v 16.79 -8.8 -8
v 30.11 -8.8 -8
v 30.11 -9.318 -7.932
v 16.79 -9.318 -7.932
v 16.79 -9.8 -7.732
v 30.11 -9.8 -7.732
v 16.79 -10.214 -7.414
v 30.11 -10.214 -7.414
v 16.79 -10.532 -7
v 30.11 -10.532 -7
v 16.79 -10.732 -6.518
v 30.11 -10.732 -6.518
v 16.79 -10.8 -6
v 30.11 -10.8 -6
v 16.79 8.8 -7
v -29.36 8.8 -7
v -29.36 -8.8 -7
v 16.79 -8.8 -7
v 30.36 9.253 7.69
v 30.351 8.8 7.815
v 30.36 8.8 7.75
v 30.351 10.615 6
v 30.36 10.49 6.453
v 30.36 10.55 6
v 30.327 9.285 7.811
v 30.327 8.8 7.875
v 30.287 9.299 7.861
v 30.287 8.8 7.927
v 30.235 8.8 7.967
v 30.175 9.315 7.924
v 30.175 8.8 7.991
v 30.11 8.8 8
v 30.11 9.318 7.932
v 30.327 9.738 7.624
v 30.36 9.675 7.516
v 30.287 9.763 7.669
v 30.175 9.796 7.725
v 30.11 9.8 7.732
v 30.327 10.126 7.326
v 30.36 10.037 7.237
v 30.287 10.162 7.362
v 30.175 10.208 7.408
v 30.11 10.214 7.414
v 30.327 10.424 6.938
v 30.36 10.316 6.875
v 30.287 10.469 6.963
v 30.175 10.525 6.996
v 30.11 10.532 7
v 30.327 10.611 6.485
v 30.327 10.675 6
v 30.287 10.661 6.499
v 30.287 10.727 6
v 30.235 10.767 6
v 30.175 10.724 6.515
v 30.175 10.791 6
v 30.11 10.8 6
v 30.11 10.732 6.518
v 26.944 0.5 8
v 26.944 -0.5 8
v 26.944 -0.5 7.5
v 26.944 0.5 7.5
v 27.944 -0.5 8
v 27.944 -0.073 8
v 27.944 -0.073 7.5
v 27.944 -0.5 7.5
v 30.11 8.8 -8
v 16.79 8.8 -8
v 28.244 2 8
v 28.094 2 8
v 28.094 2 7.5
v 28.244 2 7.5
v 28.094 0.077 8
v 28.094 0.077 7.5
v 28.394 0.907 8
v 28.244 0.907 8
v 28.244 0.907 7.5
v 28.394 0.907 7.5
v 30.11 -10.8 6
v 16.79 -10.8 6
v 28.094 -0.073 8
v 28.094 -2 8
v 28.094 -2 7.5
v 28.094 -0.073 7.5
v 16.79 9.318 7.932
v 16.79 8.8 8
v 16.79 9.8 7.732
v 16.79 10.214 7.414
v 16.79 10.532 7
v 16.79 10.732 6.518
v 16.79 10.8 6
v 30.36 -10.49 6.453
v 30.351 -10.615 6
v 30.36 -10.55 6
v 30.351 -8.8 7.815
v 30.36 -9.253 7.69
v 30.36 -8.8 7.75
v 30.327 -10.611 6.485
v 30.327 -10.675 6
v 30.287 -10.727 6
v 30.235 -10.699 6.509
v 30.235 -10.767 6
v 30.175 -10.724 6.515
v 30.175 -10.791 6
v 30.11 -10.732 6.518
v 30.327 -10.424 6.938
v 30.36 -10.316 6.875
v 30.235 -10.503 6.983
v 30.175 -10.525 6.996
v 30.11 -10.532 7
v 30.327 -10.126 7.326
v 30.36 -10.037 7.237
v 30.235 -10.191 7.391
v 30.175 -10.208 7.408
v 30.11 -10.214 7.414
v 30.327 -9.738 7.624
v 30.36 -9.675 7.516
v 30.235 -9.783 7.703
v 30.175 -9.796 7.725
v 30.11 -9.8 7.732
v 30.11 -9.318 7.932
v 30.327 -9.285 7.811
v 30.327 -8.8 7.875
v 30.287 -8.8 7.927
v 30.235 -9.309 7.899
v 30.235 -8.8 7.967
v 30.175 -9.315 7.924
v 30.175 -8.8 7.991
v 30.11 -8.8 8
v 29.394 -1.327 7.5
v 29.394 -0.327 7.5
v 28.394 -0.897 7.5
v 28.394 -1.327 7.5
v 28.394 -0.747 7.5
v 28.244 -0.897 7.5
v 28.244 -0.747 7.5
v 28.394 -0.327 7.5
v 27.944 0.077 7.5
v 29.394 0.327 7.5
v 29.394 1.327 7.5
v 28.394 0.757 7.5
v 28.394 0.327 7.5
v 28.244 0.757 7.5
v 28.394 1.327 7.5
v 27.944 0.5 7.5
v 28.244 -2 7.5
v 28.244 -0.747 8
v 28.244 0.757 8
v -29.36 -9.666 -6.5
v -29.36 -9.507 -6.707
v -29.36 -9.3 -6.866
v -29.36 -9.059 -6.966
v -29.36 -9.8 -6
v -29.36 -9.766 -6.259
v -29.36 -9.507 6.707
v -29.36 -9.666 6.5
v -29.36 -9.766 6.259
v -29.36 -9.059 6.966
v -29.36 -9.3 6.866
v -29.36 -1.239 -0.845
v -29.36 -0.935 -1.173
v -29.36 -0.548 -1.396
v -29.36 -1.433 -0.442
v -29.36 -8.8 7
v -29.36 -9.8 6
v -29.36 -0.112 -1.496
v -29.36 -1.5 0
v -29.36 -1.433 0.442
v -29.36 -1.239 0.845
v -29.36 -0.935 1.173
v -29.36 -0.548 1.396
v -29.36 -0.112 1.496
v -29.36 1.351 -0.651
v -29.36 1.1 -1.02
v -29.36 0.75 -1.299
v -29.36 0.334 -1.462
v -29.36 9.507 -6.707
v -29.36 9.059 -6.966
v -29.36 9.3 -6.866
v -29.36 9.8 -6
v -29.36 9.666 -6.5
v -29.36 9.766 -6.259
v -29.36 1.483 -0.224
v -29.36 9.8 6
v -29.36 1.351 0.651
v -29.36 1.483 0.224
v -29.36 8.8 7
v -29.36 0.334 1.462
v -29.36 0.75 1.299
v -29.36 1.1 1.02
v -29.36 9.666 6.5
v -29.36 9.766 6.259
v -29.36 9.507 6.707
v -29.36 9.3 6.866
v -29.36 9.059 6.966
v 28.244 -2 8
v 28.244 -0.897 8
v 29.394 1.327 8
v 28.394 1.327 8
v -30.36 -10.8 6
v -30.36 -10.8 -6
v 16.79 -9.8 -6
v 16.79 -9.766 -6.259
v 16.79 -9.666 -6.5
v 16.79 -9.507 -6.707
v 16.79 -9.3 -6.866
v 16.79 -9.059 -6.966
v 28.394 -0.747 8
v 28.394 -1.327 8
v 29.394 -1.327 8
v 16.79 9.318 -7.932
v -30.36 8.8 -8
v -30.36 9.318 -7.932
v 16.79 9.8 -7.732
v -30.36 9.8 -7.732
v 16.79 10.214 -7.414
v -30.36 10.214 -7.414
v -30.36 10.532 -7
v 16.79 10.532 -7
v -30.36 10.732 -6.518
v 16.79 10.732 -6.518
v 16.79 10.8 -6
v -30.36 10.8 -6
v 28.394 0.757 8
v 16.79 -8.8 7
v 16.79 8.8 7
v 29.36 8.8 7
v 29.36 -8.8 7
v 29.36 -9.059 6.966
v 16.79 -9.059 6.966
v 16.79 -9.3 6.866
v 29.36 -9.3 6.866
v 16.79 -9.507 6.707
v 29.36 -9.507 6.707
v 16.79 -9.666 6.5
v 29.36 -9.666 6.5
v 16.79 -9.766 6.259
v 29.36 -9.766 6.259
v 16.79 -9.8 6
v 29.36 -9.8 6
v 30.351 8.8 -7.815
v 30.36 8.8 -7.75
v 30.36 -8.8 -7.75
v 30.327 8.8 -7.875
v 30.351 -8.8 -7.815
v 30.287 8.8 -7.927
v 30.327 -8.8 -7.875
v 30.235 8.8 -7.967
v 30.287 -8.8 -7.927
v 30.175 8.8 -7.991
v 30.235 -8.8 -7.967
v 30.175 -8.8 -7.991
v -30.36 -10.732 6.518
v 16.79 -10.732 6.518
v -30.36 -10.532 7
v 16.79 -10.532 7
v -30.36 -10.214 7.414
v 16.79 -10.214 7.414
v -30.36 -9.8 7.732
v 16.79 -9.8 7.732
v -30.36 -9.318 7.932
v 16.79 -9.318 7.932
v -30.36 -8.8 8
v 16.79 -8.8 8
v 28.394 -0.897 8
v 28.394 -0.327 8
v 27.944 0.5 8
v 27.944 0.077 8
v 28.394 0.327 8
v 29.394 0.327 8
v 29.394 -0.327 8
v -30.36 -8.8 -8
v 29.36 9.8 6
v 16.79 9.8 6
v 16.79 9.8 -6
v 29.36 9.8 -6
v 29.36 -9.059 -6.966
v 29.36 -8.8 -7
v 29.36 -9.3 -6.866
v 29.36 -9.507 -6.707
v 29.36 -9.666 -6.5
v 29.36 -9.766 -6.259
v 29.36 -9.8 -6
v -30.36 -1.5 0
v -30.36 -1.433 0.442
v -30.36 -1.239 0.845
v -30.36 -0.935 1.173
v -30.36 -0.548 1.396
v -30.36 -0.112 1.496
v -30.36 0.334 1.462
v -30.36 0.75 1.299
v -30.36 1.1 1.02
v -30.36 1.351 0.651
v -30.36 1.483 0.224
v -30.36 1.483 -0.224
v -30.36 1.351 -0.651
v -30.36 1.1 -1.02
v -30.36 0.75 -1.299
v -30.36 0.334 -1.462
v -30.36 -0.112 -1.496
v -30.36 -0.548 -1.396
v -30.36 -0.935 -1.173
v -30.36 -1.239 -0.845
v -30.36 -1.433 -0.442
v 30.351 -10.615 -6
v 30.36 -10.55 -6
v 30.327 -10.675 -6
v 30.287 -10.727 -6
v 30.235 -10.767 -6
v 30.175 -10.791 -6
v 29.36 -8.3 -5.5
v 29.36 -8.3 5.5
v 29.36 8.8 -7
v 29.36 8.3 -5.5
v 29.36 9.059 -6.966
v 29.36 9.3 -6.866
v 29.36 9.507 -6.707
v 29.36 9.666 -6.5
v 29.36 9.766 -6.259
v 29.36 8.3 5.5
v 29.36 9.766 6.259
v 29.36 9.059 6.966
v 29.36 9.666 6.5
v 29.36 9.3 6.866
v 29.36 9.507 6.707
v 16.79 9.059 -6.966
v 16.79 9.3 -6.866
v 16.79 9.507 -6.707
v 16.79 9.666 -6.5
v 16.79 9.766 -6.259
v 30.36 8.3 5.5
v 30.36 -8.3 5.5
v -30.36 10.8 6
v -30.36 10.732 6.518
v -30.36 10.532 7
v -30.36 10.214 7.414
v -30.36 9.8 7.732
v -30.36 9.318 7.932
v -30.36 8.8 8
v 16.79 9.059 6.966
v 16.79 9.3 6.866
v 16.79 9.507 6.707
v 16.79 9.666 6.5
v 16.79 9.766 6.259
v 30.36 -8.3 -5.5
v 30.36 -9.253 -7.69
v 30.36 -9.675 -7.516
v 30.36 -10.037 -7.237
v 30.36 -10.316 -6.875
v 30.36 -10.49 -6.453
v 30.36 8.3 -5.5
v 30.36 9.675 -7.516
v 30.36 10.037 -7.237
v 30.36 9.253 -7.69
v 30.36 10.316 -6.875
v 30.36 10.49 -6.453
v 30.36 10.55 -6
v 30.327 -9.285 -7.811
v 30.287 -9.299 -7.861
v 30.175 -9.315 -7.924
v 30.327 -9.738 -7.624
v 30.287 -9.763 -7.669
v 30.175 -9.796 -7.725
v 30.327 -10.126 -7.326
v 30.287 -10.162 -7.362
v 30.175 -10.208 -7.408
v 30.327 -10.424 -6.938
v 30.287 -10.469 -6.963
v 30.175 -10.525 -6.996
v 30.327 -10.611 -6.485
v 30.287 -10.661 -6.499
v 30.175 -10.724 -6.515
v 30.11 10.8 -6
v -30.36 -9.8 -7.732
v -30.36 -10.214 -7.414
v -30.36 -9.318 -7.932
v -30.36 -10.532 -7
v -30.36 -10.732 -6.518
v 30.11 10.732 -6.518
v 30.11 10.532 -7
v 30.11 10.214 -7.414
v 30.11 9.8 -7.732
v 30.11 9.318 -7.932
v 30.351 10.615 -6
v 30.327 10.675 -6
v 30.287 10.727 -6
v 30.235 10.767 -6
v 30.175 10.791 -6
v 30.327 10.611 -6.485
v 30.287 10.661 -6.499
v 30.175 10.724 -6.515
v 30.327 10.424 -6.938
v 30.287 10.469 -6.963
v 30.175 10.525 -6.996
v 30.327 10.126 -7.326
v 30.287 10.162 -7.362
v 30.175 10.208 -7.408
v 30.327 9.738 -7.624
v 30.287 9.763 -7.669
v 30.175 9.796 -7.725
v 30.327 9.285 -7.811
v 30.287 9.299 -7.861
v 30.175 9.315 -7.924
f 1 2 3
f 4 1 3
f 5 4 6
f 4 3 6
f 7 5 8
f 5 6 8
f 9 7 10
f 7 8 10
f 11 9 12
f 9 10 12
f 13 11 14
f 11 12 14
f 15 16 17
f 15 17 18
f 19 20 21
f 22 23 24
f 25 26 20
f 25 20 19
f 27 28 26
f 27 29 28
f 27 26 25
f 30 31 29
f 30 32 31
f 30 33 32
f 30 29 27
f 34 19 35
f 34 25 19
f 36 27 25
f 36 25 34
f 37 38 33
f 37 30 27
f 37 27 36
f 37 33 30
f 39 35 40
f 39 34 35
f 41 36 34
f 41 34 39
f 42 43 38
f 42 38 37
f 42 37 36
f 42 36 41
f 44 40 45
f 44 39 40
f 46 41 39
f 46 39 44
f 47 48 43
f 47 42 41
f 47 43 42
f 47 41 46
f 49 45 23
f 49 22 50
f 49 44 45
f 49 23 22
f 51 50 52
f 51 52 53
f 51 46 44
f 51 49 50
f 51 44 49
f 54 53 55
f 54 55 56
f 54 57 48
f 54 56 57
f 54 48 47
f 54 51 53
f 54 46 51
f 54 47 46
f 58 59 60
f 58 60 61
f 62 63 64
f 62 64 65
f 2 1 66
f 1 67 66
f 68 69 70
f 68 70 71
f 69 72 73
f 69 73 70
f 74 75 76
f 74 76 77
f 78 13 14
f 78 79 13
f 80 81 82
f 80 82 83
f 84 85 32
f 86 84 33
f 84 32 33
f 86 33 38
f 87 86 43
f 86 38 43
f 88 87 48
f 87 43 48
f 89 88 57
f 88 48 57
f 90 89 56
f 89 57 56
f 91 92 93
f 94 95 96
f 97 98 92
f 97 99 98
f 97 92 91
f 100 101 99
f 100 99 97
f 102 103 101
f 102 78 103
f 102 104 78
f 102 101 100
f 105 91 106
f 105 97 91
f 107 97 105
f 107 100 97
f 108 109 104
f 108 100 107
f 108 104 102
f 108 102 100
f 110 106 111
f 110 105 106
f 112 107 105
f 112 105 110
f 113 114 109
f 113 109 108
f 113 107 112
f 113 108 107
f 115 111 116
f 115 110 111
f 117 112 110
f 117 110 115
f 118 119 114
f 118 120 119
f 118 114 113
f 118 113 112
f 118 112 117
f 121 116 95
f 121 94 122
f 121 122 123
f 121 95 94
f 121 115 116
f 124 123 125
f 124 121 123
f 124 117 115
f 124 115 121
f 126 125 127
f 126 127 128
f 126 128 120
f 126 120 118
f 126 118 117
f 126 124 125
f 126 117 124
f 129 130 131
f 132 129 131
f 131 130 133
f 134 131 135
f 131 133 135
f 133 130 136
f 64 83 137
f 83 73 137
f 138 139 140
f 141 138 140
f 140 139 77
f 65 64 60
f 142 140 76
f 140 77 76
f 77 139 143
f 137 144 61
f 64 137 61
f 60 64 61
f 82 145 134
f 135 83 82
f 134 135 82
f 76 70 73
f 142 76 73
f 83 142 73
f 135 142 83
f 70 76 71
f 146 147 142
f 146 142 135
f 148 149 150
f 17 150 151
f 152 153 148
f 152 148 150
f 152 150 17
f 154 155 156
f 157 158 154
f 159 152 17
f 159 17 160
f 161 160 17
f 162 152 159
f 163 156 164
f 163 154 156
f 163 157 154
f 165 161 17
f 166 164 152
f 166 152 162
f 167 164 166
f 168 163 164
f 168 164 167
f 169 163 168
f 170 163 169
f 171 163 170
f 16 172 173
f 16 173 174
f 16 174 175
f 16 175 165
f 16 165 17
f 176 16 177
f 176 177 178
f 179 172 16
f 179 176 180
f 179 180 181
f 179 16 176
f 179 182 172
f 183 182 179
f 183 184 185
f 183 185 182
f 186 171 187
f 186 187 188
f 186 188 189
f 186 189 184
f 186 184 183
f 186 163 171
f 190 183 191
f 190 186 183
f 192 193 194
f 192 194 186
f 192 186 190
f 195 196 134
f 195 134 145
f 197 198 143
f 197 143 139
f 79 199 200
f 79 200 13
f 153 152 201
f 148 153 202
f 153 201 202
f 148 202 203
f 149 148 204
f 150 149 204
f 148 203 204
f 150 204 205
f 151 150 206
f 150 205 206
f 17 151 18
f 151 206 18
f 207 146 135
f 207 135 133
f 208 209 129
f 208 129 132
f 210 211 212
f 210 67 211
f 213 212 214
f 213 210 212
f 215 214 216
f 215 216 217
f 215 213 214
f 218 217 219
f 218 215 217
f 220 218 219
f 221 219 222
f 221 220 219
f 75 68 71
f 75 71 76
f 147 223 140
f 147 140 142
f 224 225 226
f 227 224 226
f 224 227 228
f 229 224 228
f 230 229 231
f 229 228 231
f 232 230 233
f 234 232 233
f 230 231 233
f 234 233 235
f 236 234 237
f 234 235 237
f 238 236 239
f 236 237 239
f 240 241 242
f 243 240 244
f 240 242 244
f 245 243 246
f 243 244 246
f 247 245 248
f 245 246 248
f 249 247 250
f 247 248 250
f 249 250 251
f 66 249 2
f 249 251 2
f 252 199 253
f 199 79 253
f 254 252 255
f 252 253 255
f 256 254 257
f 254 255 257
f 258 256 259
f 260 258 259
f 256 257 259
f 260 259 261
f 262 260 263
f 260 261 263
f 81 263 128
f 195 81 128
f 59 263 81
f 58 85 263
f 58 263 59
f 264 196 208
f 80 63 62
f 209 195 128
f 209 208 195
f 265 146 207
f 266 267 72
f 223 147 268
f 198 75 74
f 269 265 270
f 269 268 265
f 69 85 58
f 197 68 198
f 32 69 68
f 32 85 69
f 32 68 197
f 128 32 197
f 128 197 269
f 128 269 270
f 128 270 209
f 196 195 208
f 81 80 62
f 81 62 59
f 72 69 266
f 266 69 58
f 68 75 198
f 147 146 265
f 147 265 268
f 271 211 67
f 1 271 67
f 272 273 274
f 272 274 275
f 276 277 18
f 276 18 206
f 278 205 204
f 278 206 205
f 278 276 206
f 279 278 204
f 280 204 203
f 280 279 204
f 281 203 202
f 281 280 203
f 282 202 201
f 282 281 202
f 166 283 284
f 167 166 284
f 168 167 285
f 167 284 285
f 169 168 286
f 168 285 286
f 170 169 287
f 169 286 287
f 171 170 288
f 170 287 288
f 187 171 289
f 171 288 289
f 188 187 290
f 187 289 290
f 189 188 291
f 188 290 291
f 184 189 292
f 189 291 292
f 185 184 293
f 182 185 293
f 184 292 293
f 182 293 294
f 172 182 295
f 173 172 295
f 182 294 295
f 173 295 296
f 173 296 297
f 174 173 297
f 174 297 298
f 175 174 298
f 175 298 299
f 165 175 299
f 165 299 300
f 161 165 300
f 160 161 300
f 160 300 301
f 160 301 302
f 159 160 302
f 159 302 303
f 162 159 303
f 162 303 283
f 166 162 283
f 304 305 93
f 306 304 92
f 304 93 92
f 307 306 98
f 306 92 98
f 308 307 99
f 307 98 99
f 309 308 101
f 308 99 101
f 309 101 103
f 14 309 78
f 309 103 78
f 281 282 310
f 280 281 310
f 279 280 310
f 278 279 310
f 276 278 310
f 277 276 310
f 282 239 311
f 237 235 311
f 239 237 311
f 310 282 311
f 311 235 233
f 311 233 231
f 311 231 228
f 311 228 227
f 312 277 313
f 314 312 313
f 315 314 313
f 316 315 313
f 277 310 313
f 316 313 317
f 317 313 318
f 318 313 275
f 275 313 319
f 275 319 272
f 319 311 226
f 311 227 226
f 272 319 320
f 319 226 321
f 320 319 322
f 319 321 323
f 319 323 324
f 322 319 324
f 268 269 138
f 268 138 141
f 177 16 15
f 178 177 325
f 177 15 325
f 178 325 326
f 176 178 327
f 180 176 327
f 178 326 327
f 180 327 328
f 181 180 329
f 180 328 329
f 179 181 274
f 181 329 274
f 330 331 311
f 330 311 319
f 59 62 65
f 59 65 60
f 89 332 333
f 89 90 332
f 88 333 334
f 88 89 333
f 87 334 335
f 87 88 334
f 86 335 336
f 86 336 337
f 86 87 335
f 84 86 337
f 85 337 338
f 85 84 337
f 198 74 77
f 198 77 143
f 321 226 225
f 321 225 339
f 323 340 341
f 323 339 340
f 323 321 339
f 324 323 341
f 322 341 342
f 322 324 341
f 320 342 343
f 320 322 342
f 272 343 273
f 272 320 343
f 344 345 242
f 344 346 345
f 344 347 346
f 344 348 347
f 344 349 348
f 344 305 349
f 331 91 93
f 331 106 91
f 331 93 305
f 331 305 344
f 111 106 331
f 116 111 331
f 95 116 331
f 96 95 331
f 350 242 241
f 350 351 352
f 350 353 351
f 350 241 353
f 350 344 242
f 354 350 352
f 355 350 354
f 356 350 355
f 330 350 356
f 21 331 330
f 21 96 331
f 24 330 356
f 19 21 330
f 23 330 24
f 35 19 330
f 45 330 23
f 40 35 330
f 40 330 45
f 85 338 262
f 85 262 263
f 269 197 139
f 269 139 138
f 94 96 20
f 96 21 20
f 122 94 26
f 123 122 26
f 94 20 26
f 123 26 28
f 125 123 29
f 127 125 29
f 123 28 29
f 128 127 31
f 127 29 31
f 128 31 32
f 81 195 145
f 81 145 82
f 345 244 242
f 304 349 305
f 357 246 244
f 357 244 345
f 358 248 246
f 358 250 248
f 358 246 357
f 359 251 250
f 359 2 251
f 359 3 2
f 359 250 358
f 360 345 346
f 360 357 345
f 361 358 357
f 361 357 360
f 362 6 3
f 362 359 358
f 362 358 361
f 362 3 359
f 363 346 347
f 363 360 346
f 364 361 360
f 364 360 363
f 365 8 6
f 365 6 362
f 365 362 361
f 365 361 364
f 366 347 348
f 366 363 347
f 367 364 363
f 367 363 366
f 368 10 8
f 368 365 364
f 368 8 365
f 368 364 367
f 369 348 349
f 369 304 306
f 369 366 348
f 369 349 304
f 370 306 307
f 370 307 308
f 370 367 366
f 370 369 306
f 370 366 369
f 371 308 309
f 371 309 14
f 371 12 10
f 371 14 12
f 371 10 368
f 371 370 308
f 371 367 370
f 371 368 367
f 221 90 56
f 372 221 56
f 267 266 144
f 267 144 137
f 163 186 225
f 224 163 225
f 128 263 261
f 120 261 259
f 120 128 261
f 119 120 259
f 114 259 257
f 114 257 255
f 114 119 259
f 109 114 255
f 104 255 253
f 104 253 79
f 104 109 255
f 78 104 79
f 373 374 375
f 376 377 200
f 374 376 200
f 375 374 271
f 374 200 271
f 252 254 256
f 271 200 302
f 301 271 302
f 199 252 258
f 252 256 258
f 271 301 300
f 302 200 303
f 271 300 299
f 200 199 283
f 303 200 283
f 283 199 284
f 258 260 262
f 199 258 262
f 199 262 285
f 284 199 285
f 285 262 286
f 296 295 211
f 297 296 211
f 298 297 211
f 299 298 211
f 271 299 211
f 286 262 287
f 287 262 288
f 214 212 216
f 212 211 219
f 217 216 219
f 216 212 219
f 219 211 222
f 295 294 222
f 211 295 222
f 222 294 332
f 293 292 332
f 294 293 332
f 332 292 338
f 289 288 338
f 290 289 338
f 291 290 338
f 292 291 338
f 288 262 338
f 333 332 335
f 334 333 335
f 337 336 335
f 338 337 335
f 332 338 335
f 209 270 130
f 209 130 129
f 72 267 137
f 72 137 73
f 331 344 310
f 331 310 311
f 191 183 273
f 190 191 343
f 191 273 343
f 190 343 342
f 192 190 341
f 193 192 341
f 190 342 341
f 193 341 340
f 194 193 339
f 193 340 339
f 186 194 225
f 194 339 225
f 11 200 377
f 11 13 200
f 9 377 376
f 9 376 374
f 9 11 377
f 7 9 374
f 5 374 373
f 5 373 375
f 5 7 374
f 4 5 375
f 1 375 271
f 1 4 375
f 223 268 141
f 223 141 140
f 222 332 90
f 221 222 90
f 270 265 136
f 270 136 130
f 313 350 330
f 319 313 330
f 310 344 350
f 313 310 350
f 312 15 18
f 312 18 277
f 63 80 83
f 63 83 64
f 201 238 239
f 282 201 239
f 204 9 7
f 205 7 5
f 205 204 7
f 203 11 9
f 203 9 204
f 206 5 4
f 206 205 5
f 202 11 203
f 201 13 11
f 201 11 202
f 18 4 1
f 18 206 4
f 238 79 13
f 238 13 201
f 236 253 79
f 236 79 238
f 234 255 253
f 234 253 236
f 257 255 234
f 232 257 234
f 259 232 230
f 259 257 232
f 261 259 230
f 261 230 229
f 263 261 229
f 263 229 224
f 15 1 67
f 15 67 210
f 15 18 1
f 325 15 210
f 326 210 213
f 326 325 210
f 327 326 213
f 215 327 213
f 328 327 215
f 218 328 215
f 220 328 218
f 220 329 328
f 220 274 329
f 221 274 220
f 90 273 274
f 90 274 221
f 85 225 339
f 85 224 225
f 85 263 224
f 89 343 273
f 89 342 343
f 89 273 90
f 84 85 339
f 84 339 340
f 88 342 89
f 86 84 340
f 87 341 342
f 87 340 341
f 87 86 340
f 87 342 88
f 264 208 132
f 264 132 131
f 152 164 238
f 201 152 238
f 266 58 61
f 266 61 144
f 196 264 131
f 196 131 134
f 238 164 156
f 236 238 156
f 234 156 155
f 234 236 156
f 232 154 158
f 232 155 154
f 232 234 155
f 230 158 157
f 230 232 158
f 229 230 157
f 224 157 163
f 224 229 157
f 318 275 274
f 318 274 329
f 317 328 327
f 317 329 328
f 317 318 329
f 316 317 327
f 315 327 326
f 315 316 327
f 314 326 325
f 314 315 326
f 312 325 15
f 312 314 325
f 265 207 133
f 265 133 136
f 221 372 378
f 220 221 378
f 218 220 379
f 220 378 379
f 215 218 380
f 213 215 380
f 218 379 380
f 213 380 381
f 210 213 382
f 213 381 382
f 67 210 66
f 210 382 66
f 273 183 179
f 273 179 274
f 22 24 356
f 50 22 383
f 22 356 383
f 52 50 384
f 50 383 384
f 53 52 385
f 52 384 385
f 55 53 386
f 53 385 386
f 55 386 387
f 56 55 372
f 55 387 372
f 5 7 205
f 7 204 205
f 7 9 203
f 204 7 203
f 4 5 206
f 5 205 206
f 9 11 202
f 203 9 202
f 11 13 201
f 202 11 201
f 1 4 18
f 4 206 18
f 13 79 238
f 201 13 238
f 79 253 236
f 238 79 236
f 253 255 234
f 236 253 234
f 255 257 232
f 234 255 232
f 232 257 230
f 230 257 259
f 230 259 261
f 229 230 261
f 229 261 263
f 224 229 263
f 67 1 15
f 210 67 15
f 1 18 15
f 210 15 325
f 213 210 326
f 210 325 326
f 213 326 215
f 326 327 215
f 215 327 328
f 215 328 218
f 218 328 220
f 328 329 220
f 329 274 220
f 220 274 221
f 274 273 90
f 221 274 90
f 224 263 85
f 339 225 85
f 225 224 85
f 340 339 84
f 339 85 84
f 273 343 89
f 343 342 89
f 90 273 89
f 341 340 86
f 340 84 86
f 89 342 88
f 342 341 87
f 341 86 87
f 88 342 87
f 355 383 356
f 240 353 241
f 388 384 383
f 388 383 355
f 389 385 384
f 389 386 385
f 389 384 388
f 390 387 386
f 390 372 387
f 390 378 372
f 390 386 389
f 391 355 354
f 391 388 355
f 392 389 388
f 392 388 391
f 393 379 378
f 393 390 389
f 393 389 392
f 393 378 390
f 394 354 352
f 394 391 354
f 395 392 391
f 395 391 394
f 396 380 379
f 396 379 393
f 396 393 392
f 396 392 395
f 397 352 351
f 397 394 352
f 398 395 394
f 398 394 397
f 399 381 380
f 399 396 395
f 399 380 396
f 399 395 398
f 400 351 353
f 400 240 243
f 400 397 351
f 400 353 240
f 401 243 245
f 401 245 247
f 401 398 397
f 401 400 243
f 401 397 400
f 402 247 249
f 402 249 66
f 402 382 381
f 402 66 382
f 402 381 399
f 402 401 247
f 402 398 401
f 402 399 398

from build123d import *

# Parameters (mm, degrees)
SKETCH_W        = 60.72
SKETCH_H        = 21.6
PAD_DEPTH       = 8
SKETCH001_W     = 13.57
SKETCH001_H     = 21.6
POCKET_DEPTH    = 10
FILLET_R        = 2
THICKNESS_T     = -1
SKETCH006_R     = 1.5
POCKET003_DEPTH = 5
SKETCH003_W     = 13.57
SKETCH003_H     = 21.6
PAD001_DEPTH    = 8
FILLET001_R     = 2
THICKNESS001_T  = -1
SKETCH004_W     = 16.6
SKETCH004_H     = 11
POCKET001_DEPTH = 5
POCKET002_DEPTH = 0.5
FILLET002_R     = 0.25


with BuildPart() as body:
    # Sketch → Pad (new body, symmetric)
    with BuildSketch(Plane.XY):
        Rectangle(SKETCH_W, SKETCH_H)
    extrude(amount=PAD_DEPTH, both=True)

    # Sketch001 → Pocket (cut, symmetric)
    with BuildSketch(Plane.XY):
        with Locations((23.575, 0)):
            Rectangle(SKETCH001_W, SKETCH001_H)
    extrude(amount=POCKET_DEPTH, both=True, mode=Mode.SUBTRACT)

    # Fillet
    fillet_edges = [body.edges().sort_by_distance(p)[0] for p in [
        (-6.785, -10.8, -8),
        (-6.785, 10.8, -8),
        (-6.785, -10.8, 8),
        (-6.785, 10.8, 8),
    ]]
    fillet(fillet_edges, radius=FILLET_R)

    # Thickness
    thickness_openings = [body.faces().sort_by_distance(p)[0] for p in [
        (16.79, 0, 0),
    ]]
    offset(amount=THICKNESS_T, openings=thickness_openings, kind=Kind.INTERSECTION)

    # Sketch006 (on Face4 of Thickness) → Pocket003 (cut)
    with BuildSketch(Plane(origin=(-30.36, 0, 0), x_dir=(0, -1, 0), z_dir=(-1, 0, 0))):
        Circle(SKETCH006_R)
    extrude(amount=-POCKET003_DEPTH, mode=Mode.SUBTRACT)


with BuildPart() as body001:
    # Sketch003 → Pad001 (new body, symmetric)
    with BuildSketch(Plane.XY):
        with Locations((23.575, 0)):
            Rectangle(SKETCH003_W, SKETCH003_H)
    extrude(amount=PAD001_DEPTH, both=True)

    # Fillet001
    fillet001_edges = [body001.edges().sort_by_distance(p)[0] for p in [
        (23.575, -10.8, 8),
        (23.575, -10.8, -8),
        (23.575, 10.8, 8),
        (23.575, 10.8, -8),
    ]]
    fillet(fillet001_edges, radius=FILLET001_R)

    # Thickness001
    thickness001_openings = [body001.faces().sort_by_distance(p)[0] for p in [
        (16.79, 0, 0),
    ]]
    offset(amount=THICKNESS001_T, openings=thickness001_openings, kind=Kind.INTERSECTION)

    # Sketch004 (on Face4 of Thickness001) → Pocket001 (cut)
    with BuildSketch(Plane.YZ.offset(30.36)):
        Rectangle(SKETCH004_W, SKETCH004_H)
    extrude(amount=-POCKET001_DEPTH, mode=Mode.SUBTRACT)

    # Sketch005 (on Face8 of Pocket001) → Pocket002 (cut)
    with BuildSketch(Plane.XY.offset(8)):
        Polygon((28.394418, -0.327356), (29.394418, -0.327356), (29.394418, -1.327356), (28.394418, -1.327356), (28.394418, -0.897356), (28.244418, -0.897356), (28.244418, -2), (28.094418, -2), (28.094418, -0.073024), (27.944418, -0.073024), (27.944418, -0.5), (26.944418, -0.5), (26.944418, 0.5), (27.944418, 0.5), (27.944418, 0.076976), (28.094418, 0.076976), (28.094418, 2), (28.244418, 2), (28.244418, 0.907356), (28.394418, 0.907356), (28.394418, 1.327356), (29.394418, 1.327356), (29.394418, 0.327356), (28.394418, 0.327356), (28.394418, 0.757356), (28.244418, 0.757356), (28.244418, -0.747356), (28.394418, -0.747356), align=None)
    extrude(amount=-POCKET002_DEPTH, mode=Mode.SUBTRACT)

    # Fillet002
    fillet002_edges = [body001.edges().sort_by_distance(p)[0] for p in [
        (30.36, 0, 8),
        (30.36, -10.214214, 7.414214),
        (30.36, -10.8, 0),
        (30.36, -10.214214, -7.414214),
        (30.36, 0, -8),
        (30.36, 10.214214, -7.414214),
        (30.36, 10.8, 0),
        (30.36, 10.214214, 7.414214),
    ]]
    fillet(fillet002_edges, radius=FILLET002_R)


solid = Compound([body.part, body001.part])
